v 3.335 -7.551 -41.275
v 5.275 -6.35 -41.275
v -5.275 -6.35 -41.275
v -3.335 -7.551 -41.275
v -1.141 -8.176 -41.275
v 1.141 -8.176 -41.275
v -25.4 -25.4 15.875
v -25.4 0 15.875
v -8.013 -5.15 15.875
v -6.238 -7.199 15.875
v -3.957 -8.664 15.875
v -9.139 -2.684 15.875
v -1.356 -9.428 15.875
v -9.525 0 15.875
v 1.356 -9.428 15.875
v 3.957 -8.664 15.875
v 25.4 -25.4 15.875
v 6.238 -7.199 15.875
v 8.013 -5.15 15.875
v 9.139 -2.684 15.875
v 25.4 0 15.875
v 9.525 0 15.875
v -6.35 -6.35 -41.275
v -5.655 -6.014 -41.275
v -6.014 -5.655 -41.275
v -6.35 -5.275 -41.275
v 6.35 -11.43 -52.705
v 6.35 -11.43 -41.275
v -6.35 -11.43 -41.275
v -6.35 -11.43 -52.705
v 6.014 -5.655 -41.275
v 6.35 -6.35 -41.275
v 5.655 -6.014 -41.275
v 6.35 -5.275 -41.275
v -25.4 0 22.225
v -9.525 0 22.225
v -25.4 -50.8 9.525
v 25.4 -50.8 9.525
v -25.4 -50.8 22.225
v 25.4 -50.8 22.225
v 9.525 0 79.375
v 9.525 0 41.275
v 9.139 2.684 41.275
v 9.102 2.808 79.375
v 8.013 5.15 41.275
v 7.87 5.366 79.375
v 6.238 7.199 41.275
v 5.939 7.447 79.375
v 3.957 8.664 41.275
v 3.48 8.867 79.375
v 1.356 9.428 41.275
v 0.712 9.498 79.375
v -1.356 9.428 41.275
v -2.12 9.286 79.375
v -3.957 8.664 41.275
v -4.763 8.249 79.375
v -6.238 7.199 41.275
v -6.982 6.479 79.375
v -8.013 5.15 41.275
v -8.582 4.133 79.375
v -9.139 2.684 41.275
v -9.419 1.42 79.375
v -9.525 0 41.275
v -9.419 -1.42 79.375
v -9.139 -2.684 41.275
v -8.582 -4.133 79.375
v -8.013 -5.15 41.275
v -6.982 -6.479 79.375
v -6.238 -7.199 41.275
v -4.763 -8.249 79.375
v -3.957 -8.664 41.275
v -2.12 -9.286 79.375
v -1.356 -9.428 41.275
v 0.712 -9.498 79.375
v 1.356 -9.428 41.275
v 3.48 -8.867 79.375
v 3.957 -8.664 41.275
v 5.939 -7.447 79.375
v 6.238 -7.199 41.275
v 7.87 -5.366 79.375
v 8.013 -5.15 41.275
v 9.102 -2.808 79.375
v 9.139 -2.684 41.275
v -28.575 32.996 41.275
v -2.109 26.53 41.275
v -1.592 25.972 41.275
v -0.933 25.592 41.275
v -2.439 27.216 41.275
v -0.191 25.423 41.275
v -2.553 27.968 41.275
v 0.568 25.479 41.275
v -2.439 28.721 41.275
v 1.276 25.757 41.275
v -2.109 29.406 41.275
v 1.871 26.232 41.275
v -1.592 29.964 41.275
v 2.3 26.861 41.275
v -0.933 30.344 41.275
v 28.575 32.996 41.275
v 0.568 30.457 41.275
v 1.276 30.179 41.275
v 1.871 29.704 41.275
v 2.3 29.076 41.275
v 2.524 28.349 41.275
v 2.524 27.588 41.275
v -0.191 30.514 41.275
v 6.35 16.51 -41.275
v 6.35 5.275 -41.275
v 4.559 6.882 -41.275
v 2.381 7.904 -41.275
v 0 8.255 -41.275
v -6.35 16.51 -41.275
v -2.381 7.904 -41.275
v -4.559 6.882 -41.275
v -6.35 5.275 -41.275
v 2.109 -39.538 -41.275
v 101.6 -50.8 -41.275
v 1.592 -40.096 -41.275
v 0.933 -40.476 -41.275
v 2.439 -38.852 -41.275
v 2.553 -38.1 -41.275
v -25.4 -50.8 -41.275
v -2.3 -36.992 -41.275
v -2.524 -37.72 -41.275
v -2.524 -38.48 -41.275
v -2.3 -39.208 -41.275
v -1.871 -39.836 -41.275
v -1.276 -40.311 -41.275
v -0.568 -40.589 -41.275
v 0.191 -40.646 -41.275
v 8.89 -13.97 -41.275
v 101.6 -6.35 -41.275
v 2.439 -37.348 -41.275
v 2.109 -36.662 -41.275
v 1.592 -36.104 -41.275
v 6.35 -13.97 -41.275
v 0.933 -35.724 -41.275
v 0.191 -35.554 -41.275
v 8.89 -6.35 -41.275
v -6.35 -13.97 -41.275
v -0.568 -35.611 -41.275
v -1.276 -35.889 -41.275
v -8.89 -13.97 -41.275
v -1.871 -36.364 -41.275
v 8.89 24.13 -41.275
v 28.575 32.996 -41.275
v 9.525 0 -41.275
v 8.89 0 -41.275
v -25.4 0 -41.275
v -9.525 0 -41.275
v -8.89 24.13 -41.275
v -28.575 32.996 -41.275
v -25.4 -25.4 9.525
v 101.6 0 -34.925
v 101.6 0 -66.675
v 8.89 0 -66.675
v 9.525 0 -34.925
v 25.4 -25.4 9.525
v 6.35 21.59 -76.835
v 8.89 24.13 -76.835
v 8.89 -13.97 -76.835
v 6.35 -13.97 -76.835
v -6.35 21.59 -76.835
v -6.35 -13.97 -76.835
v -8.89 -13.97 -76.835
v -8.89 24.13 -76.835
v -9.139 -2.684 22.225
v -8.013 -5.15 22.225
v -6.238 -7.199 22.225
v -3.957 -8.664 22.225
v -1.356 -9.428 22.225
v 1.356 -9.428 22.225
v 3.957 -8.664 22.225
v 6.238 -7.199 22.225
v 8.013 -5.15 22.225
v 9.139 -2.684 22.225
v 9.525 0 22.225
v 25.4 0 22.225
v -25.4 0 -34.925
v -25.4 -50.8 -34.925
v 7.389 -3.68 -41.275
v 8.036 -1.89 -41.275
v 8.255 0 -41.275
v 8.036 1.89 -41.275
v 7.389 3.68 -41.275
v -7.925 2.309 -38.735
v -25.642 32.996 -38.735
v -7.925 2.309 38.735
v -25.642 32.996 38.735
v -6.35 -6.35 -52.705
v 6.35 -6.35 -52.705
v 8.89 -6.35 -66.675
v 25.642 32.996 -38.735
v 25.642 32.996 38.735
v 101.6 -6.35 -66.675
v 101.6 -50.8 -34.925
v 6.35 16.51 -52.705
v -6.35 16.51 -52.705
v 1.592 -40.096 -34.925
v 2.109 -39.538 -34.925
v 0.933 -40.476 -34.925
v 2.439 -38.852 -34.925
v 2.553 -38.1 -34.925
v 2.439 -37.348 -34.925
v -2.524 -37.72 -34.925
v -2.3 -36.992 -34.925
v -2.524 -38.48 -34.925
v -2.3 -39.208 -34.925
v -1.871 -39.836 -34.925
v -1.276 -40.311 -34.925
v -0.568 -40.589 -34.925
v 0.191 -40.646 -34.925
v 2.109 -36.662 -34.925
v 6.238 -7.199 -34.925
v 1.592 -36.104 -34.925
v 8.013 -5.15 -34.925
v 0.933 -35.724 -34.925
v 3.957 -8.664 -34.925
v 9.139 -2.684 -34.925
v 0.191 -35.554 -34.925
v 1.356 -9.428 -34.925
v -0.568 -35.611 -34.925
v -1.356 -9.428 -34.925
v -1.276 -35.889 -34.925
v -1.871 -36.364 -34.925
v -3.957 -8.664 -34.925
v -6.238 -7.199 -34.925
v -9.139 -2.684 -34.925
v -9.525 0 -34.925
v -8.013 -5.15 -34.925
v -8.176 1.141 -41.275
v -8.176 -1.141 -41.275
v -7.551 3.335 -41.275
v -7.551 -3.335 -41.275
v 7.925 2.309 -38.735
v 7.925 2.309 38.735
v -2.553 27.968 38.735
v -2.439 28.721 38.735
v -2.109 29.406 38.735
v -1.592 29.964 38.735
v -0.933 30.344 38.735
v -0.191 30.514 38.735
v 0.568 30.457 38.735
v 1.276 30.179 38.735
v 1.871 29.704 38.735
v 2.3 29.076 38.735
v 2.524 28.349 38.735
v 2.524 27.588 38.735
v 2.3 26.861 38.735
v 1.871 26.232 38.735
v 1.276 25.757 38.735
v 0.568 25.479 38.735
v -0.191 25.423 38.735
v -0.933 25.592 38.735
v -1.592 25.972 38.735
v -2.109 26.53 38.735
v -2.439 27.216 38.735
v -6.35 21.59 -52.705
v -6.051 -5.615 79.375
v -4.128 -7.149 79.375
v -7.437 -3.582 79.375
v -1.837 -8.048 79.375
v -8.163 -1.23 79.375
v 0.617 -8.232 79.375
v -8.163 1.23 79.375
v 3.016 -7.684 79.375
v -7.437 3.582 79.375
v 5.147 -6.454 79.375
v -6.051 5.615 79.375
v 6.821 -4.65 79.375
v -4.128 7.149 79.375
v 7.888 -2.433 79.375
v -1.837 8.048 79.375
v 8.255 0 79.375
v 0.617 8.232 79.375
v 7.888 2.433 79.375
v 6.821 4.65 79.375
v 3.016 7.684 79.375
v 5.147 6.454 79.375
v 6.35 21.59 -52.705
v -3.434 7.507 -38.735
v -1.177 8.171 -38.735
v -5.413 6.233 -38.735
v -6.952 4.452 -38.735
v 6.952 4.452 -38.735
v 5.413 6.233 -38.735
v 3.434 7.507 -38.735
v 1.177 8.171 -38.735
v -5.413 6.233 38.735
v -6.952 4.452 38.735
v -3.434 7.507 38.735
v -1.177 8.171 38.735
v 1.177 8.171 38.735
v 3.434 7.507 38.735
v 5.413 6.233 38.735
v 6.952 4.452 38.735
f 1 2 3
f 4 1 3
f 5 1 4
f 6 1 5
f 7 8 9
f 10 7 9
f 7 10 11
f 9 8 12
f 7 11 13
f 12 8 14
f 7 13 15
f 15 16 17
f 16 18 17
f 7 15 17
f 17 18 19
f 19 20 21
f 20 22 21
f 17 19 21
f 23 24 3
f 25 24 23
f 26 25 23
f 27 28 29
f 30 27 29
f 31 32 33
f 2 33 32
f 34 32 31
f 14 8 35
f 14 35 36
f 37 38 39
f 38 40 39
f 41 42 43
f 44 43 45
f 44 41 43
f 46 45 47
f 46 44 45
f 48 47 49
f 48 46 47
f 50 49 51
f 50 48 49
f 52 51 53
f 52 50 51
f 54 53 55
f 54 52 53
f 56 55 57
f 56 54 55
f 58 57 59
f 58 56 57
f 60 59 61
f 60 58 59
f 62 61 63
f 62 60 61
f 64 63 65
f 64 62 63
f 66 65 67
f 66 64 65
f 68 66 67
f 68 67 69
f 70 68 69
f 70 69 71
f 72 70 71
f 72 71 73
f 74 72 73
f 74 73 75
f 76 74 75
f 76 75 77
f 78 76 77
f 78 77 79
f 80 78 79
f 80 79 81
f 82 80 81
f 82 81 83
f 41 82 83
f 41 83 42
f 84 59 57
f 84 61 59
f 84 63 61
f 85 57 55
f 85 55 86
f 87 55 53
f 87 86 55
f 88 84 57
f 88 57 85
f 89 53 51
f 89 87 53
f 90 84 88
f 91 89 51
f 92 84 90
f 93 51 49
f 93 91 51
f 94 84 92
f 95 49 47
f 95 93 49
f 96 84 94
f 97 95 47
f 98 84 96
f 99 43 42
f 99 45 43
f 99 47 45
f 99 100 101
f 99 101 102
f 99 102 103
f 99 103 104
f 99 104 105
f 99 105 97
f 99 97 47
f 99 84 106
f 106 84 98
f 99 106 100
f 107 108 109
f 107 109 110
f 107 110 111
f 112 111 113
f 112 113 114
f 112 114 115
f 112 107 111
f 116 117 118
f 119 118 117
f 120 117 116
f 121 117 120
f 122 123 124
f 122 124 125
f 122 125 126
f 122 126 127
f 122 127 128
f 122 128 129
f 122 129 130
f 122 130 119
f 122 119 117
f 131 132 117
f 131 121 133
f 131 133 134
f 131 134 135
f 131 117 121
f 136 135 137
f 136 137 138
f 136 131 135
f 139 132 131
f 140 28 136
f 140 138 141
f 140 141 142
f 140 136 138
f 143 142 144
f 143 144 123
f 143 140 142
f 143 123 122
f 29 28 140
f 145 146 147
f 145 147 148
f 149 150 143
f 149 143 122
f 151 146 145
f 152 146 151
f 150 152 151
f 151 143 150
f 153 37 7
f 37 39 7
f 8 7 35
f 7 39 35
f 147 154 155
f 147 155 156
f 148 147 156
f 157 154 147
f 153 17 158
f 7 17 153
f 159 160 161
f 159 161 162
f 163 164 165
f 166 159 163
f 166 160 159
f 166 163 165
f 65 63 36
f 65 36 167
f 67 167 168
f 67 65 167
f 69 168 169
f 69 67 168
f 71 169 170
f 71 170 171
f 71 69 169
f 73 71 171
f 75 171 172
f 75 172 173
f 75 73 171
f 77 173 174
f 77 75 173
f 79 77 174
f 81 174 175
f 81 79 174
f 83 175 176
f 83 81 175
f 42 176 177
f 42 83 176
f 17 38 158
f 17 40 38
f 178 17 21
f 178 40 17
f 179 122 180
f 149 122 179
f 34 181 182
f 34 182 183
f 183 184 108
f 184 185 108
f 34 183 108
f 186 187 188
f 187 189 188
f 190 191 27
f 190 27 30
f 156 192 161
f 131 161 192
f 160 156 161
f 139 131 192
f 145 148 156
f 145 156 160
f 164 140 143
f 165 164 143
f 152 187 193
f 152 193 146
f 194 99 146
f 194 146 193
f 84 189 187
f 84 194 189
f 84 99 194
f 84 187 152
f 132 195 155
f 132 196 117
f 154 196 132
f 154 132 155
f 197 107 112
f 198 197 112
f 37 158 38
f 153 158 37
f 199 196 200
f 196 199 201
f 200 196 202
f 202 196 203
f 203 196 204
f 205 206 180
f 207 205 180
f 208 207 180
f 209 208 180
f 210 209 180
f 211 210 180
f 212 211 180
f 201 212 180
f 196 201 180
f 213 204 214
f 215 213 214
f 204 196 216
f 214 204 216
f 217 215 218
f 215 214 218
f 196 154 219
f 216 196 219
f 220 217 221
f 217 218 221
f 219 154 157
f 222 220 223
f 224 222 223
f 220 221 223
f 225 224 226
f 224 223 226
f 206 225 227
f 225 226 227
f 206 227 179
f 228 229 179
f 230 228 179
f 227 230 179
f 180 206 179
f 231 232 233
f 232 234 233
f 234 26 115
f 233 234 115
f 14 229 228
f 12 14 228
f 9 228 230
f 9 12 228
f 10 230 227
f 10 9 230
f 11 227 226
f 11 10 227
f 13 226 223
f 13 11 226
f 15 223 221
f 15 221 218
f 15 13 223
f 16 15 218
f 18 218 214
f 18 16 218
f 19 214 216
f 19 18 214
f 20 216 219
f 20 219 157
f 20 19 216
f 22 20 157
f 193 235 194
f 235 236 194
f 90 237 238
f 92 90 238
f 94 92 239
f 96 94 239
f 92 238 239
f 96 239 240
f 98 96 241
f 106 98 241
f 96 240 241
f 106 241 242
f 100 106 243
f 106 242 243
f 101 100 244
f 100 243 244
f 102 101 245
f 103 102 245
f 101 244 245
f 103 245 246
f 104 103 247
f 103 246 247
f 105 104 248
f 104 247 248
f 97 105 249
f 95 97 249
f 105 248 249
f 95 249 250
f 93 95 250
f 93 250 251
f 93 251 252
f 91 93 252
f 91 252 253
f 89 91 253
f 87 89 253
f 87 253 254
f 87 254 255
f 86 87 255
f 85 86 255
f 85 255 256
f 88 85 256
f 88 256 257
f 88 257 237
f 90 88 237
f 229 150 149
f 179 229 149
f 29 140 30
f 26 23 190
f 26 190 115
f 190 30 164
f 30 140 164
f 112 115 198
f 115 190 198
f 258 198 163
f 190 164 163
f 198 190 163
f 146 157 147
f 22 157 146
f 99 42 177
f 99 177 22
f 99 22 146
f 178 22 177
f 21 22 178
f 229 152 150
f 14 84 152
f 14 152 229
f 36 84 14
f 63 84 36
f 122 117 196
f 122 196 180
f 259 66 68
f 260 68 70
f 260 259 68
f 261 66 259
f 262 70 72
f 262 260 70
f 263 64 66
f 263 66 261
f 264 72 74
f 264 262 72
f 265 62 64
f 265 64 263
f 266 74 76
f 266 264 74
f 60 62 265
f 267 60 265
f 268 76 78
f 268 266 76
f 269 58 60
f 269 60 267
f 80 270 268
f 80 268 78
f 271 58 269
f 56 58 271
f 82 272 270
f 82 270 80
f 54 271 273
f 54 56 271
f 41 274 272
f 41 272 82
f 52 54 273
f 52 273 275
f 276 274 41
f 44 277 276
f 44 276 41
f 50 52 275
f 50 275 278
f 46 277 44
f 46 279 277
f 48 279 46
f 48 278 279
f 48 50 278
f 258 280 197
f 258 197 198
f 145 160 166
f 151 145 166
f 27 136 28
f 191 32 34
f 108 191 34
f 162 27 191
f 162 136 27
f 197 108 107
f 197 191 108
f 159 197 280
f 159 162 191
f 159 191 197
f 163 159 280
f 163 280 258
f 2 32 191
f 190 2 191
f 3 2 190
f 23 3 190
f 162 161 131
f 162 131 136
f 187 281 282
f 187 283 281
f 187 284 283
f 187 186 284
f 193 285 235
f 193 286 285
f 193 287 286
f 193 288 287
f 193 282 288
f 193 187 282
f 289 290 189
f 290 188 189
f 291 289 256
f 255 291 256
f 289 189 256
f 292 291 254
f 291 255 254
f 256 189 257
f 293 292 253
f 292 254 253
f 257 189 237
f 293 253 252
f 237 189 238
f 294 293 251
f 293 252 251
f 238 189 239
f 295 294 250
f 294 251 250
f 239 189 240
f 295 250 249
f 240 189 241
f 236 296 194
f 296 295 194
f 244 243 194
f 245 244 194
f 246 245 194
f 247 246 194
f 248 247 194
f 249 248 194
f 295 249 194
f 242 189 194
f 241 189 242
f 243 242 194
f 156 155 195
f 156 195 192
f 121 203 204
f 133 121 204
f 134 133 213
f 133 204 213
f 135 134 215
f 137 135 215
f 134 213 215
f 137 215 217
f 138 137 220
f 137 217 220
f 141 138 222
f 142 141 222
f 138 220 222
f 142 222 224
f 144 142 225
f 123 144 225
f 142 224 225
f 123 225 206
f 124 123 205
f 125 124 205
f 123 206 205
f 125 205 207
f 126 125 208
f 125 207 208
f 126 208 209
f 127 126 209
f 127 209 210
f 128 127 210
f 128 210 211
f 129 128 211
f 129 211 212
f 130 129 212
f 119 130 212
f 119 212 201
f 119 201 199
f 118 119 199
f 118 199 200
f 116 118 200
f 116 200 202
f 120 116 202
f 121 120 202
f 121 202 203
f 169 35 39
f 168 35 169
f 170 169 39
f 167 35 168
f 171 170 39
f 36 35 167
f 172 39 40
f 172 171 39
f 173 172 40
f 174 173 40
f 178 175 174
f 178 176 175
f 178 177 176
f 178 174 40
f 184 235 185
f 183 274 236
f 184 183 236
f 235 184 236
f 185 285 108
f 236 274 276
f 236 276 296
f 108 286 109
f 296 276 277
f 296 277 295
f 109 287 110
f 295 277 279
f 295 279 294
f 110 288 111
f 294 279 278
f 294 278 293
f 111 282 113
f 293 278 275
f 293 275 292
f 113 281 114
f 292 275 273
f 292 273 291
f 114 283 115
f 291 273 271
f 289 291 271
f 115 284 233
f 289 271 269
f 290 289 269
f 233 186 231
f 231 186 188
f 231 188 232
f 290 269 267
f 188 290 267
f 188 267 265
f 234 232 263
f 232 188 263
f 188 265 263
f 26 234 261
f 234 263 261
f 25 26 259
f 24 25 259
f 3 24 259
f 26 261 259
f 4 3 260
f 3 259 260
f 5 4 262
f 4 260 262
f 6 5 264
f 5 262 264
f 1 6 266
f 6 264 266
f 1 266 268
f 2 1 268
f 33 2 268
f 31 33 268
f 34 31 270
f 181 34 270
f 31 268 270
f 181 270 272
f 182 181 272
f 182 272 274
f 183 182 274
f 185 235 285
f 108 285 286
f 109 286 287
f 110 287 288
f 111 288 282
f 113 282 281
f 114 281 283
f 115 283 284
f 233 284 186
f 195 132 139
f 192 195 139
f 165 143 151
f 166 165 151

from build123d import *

# Parameters (mm, degrees)
BOSS_EXTRUDE1_DEPTH         = 41.275
SHELL1_T                    = -2.54
BOSS_EXTRUDE2_START         = 38.1
SKETCH3_R                   = 9.525
BOSS_EXTRUDE2_DEPTH         = 38.1
SKETCH5_W                   = 127
SKETCH5_H                   = 50.8
BOSS_EXTRUDE3_DEPTH         = 6.35
SKETCH6_W                   = 50.8
SKETCH6_H                   = 50.8
BOSS_EXTRUDE4_DEPTH         = 6.35
SKETCH4_R                   = 8.255
CUT_EXTRUDE1_DEPTH          = 166.709452054
F_1_4_20_TAPPED_HOLE1_D     = 5.1054
F_1_4_20_TAPPED_HOLE1_DEPTH = 2.54
F_1_4_20_TAPPED_HOLE2_D     = 5.1054
F_1_4_20_TAPPED_HOLE2_DEPTH = 6.35
SKETCH24_W                  = 50.8
SKETCH24_H                  = 25.4
BOSS_EXTRUDE5_DEPTH         = 6.35
SKETCH25_W                  = 17.78
SKETCH25_H                  = 38.1
BOSS_EXTRUDE6_DEPTH         = 35.56
SKETCH26_W                  = 12.7
SKETCH26_H                  = 35.56
CUT_EXTRUDE2_DEPTH          = 35.56
SKETCH27_W                  = 12.7
SKETCH27_H                  = 5.08
BOSS_EXTRUDE7_DEPTH         = 11.43
SKETCH28_W                  = 92.71
SKETCH28_H                  = 6.35
BOSS_EXTRUDE8_DEPTH         = 25.4


with BuildPart() as part:
    # Sketch2 → Boss-Extrude1 (new, symmetric)
    with BuildSketch(Plane.XY):
        with BuildLine():
            Line((9.525, 0), (28.575, 32.995567884))
            Line((28.575, 32.995567884), (-28.575, 32.995567884))
            Line((-28.575, 32.995567884), (-9.525, 0))
            ThreePointArc((-9.525, 0), (0, -9.525), (9.525, 0))
        make_face()
    extrude(amount=BOSS_EXTRUDE1_DEPTH, both=True)

    # Shell1
    shell1_openings = [part.faces().sort_by_distance(p)[0] for p in [
        (0, 32.995567884, 0),
    ]]
    offset(amount=SHELL1_T, openings=shell1_openings, kind=Kind.INTERSECTION)

    # Sketch3 → Boss-Extrude2 (add)
    with BuildSketch(Plane.XY.offset(41.275).offset(BOSS_EXTRUDE2_START)):
        Circle(SKETCH3_R)
    extrude(amount=-BOSS_EXTRUDE2_DEPTH)

    # Sketch5 → Boss-Extrude3 (add)
    with BuildSketch(Plane(origin=(0, 0, -41.275), x_dir=(-1, 0, 0), z_dir=(0, 0, -1))):
        with Locations((-38.1, -25.4)):
            Rectangle(SKETCH5_W, SKETCH5_H)
    extrude(amount=-BOSS_EXTRUDE3_DEPTH)

    # Sketch6 → Boss-Extrude4 (add)
    with BuildSketch(Plane.XY.offset(15.875)):
        with Locations((0, -25.4)):
            Rectangle(SKETCH6_W, SKETCH6_H)
    extrude(amount=BOSS_EXTRUDE4_DEPTH)

    # Sketch4 → Cut-Extrude1 (cut, through all)
    with BuildSketch(Plane.XY.offset(79.375)):
        Circle(SKETCH4_R)
    extrude(amount=-CUT_EXTRUDE1_DEPTH, mode=Mode.SUBTRACT)

    # 1/4-20 Tapped Hole1
    with Locations(Plane.XY.offset(41.275)):
        with Locations((0, 27.968080693)):
            Hole(F_1_4_20_TAPPED_HOLE1_D / 2, depth=F_1_4_20_TAPPED_HOLE1_DEPTH)

    # 1/4-20 Tapped Hole2
    with Locations(Plane(origin=(0, 0, -41.275), x_dir=(-1, 0, 0), z_dir=(0, 0, -1))):
        with Locations((0, -38.1)):
            Hole(F_1_4_20_TAPPED_HOLE2_D / 2, depth=F_1_4_20_TAPPED_HOLE2_DEPTH)

    # Sketch24 → Boss-Extrude5 (add)
    with BuildSketch(Plane(origin=(0, 0, 15.875), x_dir=(-1, 0, 0), z_dir=(0, 0, -1))):
        with Locations((0, -38.1)):
            Rectangle(SKETCH24_W, SKETCH24_H)
    extrude(amount=BOSS_EXTRUDE5_DEPTH)

    # Sketch25 → Boss-Extrude6 (add)
    with BuildSketch(Plane(origin=(0, 0, -41.275), x_dir=(-1, 0, 0), z_dir=(0, 0, -1))):
        with Locations((0, 5.08)):
            Rectangle(SKETCH25_W, SKETCH25_H)
    extrude(amount=BOSS_EXTRUDE6_DEPTH)

    # Sketch26 → Cut-Extrude2 (cut)
    with BuildSketch(Plane(origin=(0, 0, -76.835), x_dir=(-1, 0, 0), z_dir=(0, 0, -1))):
        with Locations((0, 3.81)):
            Rectangle(SKETCH26_W, SKETCH26_H)
    extrude(amount=-CUT_EXTRUDE2_DEPTH, mode=Mode.SUBTRACT)

    # Sketch27 → Boss-Extrude7 (add)
    with BuildSketch(Plane(origin=(0, 0, -41.275), x_dir=(-1, 0, 0), z_dir=(0, 0, -1))):
        with Locations((0, 19.05)):
            Rectangle(SKETCH27_W, SKETCH27_H)
        with Locations((0, -8.89)):
            Rectangle(SKETCH27_W, SKETCH27_H)
    extrude(amount=BOSS_EXTRUDE7_DEPTH)

    # Sketch28 → Boss-Extrude8 (add)
    with BuildSketch(Plane(origin=(0, 0, -41.275), x_dir=(-1, 0, 0), z_dir=(0, 0, -1))):
        with Locations((-55.245, -3.175)):
            Rectangle(SKETCH28_W, SKETCH28_H)
    extrude(amount=BOSS_EXTRUDE8_DEPTH)


solid = part.part
